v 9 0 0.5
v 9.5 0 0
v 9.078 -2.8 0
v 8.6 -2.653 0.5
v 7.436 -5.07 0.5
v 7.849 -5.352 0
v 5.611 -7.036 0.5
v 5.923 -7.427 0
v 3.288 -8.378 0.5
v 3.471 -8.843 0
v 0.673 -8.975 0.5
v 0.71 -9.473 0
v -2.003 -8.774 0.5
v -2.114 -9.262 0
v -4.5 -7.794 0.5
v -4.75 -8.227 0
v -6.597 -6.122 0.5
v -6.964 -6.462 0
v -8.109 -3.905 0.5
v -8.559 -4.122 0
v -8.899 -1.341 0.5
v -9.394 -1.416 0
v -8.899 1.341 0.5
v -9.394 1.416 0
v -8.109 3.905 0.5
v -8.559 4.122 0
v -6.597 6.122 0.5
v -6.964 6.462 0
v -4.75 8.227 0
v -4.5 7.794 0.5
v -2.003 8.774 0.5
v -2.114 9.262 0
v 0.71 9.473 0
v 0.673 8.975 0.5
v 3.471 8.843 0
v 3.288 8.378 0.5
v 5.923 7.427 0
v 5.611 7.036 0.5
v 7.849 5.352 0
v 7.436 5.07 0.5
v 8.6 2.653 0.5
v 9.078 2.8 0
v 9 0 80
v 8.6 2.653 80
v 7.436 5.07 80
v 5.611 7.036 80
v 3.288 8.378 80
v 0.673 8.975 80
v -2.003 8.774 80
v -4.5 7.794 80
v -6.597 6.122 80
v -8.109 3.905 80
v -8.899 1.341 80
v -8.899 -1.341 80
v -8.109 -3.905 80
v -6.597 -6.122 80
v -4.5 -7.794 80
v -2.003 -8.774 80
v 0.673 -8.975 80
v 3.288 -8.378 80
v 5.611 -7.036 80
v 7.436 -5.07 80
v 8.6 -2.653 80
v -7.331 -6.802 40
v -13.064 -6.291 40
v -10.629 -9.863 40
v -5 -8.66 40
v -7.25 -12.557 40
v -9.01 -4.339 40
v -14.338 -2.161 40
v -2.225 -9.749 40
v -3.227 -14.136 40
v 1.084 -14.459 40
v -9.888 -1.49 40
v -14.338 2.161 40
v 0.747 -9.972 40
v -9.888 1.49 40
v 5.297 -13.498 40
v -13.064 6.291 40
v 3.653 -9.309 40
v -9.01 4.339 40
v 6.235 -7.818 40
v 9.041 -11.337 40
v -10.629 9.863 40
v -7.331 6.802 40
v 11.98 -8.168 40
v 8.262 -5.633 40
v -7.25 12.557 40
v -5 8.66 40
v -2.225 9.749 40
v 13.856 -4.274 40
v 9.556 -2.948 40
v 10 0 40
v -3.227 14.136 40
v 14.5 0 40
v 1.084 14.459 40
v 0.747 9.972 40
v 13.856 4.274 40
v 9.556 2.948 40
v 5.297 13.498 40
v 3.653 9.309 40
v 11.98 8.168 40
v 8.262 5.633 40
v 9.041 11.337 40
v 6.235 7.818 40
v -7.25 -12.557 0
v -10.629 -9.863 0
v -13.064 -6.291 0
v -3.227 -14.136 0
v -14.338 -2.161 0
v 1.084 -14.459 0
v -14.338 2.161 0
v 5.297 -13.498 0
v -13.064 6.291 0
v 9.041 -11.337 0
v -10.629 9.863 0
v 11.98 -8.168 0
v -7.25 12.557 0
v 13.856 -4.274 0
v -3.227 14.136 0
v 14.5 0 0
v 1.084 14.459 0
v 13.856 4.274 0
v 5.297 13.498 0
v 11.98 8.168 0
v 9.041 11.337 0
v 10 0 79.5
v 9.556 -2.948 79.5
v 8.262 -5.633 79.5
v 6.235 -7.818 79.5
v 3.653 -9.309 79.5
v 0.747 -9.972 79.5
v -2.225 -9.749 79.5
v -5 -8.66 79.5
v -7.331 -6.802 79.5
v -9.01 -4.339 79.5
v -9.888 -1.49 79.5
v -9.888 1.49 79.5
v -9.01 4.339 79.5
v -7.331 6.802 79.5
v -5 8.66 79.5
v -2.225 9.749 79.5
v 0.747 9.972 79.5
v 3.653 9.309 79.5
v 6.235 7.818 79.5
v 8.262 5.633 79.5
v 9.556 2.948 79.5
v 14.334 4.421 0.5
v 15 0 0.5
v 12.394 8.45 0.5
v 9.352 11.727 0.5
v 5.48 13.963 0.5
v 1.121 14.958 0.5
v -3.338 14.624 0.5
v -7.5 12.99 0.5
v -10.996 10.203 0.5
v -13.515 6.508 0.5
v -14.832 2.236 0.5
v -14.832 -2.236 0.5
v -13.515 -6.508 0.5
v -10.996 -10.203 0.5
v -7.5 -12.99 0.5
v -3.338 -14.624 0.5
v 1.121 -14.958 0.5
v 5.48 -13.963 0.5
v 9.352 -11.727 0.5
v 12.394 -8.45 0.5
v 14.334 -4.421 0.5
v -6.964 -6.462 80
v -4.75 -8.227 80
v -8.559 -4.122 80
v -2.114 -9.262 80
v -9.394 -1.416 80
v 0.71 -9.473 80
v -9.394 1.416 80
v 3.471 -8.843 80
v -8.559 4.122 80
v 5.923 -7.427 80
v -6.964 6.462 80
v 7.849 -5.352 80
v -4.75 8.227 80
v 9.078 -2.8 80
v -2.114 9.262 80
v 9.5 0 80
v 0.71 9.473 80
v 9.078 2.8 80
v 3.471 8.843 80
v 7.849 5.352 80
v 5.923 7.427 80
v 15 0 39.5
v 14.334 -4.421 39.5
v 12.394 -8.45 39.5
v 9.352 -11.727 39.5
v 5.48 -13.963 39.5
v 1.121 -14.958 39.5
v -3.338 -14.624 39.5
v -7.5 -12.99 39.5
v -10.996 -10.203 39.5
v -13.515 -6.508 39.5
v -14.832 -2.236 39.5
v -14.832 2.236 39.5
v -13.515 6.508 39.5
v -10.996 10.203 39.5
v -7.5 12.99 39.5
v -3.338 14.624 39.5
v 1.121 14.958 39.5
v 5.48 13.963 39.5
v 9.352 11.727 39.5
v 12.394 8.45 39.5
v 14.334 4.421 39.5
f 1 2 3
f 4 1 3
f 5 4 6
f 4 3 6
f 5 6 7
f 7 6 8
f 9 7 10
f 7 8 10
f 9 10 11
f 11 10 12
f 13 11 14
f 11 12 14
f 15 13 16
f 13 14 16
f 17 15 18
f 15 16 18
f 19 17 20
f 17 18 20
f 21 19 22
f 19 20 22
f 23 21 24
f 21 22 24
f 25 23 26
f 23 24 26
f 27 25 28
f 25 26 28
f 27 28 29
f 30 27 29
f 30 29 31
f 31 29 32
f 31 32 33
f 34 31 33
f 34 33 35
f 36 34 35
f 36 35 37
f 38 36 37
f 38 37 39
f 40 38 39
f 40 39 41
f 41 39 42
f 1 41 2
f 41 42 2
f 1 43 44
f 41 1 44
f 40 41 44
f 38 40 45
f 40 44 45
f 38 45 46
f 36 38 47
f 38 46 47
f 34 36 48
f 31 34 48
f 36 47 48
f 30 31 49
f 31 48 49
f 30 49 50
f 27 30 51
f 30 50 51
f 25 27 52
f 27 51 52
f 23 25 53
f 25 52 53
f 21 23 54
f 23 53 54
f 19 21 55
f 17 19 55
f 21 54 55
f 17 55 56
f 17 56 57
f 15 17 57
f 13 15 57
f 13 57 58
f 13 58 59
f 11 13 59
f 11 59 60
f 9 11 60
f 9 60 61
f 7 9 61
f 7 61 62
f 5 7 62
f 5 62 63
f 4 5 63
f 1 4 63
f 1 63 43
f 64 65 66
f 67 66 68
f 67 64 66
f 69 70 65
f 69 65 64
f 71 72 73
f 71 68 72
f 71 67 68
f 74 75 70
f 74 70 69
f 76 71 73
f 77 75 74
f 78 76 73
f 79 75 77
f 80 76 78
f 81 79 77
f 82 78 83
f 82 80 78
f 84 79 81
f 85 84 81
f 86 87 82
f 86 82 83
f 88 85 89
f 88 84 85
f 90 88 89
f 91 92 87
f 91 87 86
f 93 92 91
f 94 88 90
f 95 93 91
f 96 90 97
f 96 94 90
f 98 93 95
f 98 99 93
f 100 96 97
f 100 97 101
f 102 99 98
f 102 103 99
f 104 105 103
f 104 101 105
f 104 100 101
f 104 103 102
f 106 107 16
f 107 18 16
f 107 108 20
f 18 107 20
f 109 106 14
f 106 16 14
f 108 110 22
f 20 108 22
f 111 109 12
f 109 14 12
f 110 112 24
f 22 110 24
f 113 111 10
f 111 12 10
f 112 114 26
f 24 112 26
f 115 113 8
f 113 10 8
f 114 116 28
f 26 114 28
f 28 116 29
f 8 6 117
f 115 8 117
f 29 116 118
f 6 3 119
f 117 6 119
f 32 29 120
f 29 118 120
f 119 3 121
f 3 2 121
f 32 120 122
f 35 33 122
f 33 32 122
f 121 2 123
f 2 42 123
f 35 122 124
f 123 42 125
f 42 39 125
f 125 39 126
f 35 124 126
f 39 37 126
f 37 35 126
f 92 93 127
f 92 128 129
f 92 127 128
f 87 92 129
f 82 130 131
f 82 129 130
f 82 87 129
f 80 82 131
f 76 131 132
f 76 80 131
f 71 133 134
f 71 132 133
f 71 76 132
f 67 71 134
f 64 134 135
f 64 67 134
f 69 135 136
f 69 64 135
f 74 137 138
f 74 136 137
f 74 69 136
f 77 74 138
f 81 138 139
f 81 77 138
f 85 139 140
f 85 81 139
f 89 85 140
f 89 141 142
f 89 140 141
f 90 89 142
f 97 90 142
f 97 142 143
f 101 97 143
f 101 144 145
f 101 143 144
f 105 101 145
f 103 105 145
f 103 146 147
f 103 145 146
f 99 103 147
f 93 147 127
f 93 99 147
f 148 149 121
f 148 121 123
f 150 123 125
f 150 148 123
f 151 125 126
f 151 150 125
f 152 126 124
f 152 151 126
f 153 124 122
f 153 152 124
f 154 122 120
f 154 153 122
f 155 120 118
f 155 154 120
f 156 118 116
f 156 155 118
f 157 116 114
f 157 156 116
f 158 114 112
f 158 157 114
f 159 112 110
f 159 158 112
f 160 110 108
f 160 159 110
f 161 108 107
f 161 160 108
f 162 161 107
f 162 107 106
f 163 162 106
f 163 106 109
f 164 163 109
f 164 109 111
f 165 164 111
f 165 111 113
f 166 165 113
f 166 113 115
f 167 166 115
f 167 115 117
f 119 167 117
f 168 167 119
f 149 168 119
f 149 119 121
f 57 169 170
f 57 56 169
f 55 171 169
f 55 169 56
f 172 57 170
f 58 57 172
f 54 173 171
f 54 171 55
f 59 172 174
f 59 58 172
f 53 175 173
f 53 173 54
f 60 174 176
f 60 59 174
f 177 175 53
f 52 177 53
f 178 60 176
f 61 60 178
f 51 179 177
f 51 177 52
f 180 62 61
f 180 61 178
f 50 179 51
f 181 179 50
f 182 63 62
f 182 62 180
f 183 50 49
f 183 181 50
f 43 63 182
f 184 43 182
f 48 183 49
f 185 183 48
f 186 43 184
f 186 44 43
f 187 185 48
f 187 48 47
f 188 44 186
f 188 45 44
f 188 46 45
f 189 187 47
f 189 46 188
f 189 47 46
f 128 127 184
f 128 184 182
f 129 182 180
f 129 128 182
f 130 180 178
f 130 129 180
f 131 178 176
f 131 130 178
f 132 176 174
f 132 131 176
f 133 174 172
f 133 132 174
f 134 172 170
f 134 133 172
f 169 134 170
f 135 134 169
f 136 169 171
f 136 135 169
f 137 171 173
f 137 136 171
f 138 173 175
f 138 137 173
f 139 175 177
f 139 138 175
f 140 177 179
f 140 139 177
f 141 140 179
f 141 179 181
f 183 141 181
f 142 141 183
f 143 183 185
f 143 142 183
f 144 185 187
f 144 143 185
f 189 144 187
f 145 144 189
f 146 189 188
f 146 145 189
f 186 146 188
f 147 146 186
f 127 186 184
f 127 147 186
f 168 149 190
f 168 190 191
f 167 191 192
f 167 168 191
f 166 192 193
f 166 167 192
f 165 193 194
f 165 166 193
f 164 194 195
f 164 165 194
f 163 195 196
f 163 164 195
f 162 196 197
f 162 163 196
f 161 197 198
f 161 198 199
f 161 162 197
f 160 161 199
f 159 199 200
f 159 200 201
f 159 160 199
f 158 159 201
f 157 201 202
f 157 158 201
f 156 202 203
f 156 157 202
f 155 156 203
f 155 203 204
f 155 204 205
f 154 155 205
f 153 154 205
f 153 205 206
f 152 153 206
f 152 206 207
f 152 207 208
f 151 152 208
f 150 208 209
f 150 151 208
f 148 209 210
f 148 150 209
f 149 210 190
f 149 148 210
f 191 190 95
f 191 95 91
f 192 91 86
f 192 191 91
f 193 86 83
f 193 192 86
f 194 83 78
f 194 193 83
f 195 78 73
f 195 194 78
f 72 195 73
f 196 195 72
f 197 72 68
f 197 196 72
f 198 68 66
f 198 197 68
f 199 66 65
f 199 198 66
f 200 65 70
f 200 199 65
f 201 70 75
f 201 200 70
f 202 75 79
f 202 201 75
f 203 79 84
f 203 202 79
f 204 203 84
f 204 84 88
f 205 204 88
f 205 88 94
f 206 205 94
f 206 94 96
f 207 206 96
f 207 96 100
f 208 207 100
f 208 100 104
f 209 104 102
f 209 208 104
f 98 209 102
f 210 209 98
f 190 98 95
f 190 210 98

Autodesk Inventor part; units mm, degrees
ref_plane "YZ Plane" through (0, 0, 0) normal (1, 0, 0) x (0, 1, 0)
ref_plane "XZ Plane" through (0, 0, 0) normal (0, 1, 0) x (-1, 0, 0)
ref_plane "XY Plane" through (0, 0, 0) normal (0, 0, 1) x (1, 0, 0)
sketch "Skizze1" plane through (0, 0, 0) normal (0, 0, 1) x (1, 0, 0)
  line L0 (-21, 0) -> (21, 0) projected
  line L1 (0, -21) -> (0, 21) projected
  circle A0 centre (0, 0) radius 15
  dimension "d0" = 30
extrude "Extrusion1" add sketch "Skizze1" along normal blind 40
sketch "Skizze2" plane through (0, 0, 40) normal (0, 0, 1) x (1, 0, 0)
  circle A0 centre (0, 0) radius 10
  dimension "d3" = 20
extrude "Extrusion2" add sketch "Skizze2" along normal blind 40
thread "Gewinde1" size "M30x3.5" class "6g" standard "ANSI Metric M Profile" length 10
thread "Gewinde2" size "M20x2.5" class "6g" standard "ANSI Metric M Profile" length 10
chamfer "Fase1" distance 0.5 angle 45 1 edges at (-15, 0, 40)
sketch "Skizze3" plane through (0, 0, 80) normal (0, 0, 1) x (1, 0, 0)
  circle A0 centre (0, 0) radius 9
  dimension "d13" = 18
extrude "Extrusion3" cut sketch "Skizze3" against normal blind 80
chamfer "Fase2" distance 0.5 angle 45 3 edges at (-10, 0, 80) (-9, 0, 0) (-15, 0, 0)
properties part number "Durchflusssensor"
